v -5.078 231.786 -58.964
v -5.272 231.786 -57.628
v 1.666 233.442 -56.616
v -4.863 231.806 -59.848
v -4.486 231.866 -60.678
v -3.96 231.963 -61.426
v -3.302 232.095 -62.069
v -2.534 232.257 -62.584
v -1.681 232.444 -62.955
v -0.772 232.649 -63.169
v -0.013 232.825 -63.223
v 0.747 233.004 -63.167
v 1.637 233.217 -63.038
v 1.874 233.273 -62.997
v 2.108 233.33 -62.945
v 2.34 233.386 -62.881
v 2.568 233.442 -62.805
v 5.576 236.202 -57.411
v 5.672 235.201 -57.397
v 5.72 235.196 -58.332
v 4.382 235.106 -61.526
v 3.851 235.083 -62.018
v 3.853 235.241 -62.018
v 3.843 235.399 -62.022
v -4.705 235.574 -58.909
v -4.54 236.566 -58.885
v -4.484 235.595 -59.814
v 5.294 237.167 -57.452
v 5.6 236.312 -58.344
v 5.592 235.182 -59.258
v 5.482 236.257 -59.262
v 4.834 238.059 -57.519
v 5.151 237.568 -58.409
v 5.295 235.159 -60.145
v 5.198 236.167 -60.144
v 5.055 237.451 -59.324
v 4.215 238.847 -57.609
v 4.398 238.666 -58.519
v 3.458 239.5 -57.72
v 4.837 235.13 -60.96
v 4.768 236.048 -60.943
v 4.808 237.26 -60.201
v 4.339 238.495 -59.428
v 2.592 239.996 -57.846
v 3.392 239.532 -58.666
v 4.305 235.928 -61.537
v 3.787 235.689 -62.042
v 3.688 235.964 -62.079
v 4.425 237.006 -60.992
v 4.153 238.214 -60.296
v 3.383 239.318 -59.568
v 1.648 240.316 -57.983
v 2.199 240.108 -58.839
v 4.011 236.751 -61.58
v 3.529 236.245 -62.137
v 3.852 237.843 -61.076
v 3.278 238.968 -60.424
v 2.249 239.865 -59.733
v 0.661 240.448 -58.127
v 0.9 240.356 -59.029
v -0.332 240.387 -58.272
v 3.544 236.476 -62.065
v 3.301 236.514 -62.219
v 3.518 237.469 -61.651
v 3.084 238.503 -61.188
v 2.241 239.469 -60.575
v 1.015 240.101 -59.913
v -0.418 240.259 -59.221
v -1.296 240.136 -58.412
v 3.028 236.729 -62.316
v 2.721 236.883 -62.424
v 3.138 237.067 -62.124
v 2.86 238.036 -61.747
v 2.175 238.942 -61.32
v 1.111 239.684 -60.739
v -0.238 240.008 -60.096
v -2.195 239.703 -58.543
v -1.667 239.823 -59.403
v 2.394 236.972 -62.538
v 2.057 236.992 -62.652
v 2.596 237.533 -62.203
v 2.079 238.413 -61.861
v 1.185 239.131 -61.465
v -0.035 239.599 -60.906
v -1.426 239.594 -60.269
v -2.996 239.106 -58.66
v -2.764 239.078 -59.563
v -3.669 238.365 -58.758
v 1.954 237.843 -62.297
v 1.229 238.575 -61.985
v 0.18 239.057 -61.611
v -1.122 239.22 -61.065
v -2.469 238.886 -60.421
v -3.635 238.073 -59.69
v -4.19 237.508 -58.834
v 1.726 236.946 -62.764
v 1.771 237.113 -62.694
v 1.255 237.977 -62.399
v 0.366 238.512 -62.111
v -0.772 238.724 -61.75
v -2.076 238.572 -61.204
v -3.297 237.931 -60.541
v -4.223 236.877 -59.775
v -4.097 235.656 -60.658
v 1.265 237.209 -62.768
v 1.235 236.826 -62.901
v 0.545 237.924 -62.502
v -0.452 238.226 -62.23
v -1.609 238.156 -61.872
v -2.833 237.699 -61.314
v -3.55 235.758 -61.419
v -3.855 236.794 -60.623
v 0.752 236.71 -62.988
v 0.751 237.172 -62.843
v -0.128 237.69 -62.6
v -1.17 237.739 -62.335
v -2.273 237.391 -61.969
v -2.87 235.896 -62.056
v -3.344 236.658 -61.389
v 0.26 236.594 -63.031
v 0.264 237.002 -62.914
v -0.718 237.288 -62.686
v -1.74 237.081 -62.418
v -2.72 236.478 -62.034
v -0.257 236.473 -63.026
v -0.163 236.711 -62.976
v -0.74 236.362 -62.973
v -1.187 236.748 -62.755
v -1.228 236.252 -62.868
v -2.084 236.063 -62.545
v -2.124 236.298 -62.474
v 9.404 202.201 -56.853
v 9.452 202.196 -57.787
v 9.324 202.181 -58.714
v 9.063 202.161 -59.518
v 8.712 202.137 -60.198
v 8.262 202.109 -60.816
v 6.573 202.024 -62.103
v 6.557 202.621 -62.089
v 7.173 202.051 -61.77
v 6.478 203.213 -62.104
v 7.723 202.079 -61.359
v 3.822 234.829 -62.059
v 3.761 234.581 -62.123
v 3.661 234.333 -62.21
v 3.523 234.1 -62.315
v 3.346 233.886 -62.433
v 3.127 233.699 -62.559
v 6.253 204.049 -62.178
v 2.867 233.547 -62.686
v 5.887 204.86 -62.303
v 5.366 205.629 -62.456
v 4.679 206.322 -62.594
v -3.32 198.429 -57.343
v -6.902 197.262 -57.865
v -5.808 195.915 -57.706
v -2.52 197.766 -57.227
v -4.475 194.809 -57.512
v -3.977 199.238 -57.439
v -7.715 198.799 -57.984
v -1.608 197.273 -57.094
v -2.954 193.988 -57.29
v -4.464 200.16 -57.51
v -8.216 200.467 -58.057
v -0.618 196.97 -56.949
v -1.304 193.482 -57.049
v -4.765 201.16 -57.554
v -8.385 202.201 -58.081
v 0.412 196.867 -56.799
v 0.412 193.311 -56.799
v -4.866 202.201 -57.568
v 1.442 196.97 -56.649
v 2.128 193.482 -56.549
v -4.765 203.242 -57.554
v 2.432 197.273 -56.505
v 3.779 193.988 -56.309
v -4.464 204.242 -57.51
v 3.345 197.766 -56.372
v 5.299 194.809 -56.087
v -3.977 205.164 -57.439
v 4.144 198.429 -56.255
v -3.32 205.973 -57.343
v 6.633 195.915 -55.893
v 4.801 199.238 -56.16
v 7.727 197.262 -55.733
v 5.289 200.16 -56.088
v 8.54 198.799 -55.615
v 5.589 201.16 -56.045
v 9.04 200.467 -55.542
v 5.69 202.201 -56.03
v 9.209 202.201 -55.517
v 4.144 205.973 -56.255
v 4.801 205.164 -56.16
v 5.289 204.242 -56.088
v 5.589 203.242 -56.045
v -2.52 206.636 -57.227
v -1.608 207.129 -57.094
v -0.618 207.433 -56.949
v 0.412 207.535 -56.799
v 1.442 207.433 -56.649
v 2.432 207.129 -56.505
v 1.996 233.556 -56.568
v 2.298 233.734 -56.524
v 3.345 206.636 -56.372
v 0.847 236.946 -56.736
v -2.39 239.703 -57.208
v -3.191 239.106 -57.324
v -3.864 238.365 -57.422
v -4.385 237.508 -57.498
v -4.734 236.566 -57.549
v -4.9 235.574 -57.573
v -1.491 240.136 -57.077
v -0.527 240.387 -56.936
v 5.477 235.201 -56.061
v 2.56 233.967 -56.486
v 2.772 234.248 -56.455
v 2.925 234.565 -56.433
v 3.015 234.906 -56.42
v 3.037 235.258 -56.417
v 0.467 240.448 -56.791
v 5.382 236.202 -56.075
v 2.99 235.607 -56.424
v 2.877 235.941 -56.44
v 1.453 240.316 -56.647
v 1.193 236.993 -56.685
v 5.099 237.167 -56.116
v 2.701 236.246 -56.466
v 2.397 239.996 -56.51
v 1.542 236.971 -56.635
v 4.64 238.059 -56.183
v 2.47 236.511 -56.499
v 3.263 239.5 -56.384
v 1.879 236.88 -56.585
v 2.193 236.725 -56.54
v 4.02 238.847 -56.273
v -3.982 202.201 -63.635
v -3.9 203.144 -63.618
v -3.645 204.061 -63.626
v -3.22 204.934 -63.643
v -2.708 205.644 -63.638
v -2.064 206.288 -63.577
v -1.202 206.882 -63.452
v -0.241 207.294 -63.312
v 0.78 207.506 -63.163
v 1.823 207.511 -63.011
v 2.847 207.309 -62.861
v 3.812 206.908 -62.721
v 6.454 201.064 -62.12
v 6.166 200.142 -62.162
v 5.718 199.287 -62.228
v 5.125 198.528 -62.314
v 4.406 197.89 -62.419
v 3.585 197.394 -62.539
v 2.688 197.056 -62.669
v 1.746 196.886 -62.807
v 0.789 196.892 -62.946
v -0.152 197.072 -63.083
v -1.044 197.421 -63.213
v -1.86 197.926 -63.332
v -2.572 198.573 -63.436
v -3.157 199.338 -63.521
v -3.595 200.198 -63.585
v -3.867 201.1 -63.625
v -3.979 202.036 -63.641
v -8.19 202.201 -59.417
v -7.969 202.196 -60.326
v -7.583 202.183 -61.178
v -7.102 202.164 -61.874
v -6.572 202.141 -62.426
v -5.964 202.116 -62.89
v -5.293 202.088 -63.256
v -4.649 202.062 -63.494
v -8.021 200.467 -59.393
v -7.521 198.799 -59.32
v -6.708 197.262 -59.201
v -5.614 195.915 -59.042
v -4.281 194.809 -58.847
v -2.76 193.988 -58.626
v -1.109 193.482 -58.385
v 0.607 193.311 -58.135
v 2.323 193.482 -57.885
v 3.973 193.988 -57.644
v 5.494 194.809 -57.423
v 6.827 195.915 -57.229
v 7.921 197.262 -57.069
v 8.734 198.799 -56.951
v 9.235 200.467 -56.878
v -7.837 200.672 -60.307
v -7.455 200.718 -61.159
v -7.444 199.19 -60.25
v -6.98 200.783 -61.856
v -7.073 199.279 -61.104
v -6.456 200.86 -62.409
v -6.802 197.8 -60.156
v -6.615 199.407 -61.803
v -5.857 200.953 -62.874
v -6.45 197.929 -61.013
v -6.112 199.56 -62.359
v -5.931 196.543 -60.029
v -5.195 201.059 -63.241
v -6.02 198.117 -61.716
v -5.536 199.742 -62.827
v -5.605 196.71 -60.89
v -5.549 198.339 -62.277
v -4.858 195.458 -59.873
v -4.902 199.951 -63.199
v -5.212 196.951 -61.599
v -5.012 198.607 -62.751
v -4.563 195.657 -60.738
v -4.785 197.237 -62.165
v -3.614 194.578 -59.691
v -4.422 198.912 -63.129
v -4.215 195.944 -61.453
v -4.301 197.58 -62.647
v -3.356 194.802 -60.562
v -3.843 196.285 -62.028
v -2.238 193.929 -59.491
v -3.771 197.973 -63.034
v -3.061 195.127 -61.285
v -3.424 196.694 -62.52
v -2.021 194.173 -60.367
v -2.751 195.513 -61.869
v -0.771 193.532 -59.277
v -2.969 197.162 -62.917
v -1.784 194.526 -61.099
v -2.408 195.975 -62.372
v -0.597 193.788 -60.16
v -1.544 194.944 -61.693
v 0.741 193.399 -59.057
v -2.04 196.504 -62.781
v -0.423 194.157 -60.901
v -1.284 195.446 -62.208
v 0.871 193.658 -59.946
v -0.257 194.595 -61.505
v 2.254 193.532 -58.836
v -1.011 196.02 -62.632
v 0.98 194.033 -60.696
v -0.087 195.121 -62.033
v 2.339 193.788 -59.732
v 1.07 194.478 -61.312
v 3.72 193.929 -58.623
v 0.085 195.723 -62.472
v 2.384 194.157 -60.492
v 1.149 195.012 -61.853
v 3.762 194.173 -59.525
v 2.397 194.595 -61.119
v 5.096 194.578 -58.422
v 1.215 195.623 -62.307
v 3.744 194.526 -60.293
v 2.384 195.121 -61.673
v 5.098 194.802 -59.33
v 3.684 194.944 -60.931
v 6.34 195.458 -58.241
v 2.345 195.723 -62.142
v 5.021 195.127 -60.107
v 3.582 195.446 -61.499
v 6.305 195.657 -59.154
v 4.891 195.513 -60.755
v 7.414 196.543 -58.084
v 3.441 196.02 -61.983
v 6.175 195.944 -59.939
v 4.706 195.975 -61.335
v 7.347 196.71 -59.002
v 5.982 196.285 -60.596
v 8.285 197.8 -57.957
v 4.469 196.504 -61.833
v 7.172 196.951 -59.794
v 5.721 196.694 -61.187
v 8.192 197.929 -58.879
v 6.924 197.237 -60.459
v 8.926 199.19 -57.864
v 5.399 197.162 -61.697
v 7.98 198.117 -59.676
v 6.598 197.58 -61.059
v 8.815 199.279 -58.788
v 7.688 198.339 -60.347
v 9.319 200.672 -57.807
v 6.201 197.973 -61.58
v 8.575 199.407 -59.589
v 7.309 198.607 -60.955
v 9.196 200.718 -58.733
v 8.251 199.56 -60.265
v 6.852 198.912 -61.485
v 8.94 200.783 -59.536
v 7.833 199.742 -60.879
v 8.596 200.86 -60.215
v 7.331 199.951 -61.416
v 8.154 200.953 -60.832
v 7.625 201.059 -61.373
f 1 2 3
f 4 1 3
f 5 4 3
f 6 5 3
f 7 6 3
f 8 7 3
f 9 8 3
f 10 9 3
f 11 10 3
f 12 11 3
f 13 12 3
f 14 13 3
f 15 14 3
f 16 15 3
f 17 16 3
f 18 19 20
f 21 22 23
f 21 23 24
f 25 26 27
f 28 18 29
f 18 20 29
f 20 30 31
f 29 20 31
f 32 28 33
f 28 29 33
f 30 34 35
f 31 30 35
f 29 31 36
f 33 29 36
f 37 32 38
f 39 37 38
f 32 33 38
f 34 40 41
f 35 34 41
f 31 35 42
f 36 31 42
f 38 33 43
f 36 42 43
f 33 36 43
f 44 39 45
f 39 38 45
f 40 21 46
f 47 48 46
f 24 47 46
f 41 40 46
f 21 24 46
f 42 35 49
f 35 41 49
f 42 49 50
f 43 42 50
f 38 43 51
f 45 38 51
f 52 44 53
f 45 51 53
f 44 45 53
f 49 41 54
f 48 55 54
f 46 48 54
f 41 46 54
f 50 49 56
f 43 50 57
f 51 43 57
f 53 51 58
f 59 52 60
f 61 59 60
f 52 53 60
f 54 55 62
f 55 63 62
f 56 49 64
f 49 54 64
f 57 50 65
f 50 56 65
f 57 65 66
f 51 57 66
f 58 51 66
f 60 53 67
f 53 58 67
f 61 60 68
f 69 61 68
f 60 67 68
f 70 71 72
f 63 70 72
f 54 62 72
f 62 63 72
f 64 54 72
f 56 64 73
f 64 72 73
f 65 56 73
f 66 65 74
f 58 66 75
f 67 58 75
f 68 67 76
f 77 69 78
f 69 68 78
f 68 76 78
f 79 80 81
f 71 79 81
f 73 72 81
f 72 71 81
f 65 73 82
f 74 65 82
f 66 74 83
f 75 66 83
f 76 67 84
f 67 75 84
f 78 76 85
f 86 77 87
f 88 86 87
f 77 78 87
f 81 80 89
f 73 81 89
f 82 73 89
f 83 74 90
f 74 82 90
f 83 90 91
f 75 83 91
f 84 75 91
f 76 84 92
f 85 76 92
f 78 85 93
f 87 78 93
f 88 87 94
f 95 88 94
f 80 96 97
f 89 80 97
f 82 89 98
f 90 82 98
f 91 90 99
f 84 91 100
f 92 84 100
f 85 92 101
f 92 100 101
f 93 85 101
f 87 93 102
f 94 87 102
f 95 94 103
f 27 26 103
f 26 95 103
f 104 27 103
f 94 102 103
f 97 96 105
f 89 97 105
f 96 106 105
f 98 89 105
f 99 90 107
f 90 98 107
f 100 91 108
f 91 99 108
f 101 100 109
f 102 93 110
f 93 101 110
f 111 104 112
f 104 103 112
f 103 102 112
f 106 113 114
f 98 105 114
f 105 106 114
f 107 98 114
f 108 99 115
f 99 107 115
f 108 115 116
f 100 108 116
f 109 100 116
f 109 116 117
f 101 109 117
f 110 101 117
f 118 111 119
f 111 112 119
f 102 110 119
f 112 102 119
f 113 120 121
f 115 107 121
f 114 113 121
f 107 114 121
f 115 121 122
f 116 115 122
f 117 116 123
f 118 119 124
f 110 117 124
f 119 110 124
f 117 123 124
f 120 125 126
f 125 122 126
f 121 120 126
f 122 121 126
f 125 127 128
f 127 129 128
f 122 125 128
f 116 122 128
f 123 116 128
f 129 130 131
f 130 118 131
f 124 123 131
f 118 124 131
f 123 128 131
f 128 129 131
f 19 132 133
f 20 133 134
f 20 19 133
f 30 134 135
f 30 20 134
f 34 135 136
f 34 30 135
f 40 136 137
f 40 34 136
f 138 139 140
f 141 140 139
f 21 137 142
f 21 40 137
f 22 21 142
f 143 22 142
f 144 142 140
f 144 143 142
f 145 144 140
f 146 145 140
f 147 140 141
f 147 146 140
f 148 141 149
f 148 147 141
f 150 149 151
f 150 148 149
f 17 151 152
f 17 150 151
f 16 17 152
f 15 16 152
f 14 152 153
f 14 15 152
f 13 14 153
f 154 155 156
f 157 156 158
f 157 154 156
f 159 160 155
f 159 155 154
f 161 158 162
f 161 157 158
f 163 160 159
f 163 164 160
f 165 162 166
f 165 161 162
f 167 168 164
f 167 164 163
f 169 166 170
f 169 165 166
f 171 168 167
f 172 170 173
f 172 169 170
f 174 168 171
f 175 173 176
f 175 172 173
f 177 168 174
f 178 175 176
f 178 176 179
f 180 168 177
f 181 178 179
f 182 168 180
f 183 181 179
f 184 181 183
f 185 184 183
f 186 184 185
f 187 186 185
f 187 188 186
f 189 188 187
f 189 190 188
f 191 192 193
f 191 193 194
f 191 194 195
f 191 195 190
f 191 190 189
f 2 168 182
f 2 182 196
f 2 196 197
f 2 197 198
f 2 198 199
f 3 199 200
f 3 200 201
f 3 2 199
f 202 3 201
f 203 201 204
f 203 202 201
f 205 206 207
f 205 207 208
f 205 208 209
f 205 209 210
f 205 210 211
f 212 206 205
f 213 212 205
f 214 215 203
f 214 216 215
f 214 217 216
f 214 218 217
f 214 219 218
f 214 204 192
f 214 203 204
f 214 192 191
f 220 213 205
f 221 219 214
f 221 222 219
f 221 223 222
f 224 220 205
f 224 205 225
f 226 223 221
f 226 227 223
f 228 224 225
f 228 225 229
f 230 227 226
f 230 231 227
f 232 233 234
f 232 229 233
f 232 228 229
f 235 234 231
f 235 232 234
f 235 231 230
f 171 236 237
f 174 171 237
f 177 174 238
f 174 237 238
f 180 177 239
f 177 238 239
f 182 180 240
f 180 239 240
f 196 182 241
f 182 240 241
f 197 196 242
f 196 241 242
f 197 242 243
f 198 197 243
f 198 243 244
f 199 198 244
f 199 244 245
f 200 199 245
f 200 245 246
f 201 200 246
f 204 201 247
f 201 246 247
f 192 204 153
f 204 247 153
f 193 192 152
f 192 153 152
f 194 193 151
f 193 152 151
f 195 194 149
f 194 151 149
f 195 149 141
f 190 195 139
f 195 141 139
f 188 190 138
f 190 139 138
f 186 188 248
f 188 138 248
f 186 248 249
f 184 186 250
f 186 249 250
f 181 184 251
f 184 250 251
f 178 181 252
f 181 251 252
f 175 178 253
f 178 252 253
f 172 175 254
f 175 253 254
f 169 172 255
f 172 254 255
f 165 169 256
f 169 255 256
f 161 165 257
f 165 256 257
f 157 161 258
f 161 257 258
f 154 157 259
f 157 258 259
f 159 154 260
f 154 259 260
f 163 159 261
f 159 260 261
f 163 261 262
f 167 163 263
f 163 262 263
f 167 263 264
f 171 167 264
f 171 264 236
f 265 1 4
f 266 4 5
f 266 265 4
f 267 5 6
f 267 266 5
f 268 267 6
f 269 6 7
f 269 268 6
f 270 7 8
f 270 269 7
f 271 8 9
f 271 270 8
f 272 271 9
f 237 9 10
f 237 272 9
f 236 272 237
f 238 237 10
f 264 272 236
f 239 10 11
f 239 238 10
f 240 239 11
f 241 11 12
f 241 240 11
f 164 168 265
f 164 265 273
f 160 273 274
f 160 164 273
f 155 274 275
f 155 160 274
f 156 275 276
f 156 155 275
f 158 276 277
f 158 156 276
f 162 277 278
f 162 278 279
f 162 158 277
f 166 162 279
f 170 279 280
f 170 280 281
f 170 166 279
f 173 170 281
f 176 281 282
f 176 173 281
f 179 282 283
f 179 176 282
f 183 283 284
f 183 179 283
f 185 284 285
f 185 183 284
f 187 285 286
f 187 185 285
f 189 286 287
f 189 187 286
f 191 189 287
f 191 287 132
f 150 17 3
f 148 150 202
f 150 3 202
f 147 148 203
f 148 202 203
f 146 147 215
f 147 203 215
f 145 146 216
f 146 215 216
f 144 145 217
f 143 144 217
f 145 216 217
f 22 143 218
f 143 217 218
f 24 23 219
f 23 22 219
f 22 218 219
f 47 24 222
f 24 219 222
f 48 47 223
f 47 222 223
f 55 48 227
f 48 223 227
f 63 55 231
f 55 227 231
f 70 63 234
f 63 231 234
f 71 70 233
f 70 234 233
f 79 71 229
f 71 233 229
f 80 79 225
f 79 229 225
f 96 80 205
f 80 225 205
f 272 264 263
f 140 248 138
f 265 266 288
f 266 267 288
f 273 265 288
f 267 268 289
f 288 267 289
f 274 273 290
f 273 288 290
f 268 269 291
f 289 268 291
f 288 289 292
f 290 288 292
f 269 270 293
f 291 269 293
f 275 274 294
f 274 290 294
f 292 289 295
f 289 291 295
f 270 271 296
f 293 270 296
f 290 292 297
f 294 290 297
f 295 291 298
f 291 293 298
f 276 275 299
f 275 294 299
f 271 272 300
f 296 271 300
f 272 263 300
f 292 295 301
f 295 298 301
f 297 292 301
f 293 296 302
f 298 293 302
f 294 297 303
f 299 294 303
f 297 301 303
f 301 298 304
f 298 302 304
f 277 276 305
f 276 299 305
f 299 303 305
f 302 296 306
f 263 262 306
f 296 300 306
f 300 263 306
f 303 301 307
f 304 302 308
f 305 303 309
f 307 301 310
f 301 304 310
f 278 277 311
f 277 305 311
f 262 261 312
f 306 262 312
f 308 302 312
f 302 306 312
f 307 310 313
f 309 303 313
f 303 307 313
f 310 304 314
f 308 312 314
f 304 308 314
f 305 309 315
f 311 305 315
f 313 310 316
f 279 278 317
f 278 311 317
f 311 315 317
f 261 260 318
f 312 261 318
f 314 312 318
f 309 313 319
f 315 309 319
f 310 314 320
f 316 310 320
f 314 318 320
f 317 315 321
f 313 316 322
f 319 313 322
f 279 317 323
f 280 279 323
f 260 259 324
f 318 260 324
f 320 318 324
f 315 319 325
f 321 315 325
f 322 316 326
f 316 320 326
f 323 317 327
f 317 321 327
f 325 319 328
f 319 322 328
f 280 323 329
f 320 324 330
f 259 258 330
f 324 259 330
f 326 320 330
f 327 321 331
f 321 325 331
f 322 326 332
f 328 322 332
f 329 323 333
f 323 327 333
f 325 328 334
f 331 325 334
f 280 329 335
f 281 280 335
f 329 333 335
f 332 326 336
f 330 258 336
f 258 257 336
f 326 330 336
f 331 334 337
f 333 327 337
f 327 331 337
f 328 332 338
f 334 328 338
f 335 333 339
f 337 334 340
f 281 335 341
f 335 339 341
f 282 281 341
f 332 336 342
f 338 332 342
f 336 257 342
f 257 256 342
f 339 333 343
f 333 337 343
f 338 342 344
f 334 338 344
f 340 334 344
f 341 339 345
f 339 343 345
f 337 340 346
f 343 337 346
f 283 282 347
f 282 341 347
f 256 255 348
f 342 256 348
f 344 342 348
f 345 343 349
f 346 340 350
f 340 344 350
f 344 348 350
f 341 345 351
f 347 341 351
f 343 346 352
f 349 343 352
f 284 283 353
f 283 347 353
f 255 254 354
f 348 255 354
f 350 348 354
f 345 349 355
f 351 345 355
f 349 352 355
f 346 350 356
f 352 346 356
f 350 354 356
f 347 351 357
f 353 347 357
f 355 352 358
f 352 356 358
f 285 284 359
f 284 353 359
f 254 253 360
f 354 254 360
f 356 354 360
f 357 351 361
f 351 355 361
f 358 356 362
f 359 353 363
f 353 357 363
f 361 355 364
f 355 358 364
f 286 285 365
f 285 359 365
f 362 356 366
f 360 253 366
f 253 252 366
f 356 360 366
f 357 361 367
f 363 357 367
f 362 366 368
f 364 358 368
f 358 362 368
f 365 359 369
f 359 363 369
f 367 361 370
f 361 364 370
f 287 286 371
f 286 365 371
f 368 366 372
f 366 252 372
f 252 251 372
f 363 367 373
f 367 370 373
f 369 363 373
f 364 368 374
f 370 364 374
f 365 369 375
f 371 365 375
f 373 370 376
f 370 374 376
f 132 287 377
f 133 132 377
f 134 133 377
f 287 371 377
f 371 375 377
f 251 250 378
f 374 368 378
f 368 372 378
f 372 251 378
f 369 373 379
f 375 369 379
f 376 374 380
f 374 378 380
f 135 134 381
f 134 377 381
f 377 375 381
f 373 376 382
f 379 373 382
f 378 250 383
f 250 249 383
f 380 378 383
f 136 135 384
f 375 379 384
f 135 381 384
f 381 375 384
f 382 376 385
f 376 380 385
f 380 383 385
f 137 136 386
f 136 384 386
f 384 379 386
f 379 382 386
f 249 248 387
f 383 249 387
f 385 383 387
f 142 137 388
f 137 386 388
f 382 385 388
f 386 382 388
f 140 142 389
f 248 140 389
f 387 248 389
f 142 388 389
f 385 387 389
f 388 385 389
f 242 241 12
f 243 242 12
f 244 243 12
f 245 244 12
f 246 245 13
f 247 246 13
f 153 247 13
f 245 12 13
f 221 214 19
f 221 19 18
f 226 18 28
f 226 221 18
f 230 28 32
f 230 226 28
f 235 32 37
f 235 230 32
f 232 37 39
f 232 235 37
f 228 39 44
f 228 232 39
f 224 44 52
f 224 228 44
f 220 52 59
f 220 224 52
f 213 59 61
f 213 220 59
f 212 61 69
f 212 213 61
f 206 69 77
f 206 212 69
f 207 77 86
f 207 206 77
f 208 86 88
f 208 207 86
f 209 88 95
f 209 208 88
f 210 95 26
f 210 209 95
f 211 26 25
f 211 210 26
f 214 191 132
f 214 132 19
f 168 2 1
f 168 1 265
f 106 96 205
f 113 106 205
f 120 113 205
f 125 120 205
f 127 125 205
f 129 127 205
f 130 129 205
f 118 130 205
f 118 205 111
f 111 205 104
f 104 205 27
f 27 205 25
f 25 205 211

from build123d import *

# Parameters (mm, degrees)
BASE_EXTRUDE_DEPTH = 6.35
FILLET1_R          = 5
CUT_EXTRUDE1_START = -6.35
CUT_EXTRUDE1_DEPTH = 6.350746
SKETCH4_R          = 5.334
CUT_EXTRUDE2_DEPTH = 6.35


with BuildPart() as part:
    # Sketch1 → Base Extrude (new body)
    with BuildSketch(Plane(origin=(8.114628625, -3.283425705, -55.67660861), x_dir=(-0.989545354, 0, -0.144222022), z_dir=(0.144222022, 0, -0.989545354))):
        with BuildLine():
            Line((-1.106091457, 205.484448373), (2.665349365, 238.484448373))
            ThreePointArc((2.665349365, 238.484448373), (7.915349365, 243.734448373), (13.165349365, 238.484448373))
            Line((13.165349365, 238.484448373), (16.673908543, 205.484448373))
            ThreePointArc((16.673908543, 205.484448373), (7.783908543, 196.594448373), (-1.106091457, 205.484448373))
        make_face()
    extrude(amount=BASE_EXTRUDE_DEPTH)

    # Fillet1
    fillet1_edges = [part.edges().sort_by_distance(p)[0] for p in [
        (-5.733211058, 218.701022668, -64.111960662),
        (1.327907925, 193.311022668, -63.082832637),
        (8.258960253, 218.701022668, -62.072661274),
        (1.19784127, 240.451022668, -63.101789298),
    ]]
    fillet(fillet1_edges, radius=FILLET1_R)

    # Sketch3 → Cut-Extrude1 (cut)
    with BuildSketch(Plane(origin=(9.030438463, -3.283425705, -61.96022161), x_dir=(-0.989545354, 0, -0.144222022), z_dir=(0.144222022, 0, -0.989545354)).offset(CUT_EXTRUDE1_START)):
        with BuildLine():
            Line((14.3026167, 234.886394841), (6.516843813, 236.725345777))
            ThreePointArc((6.516843813, 236.725345777), (5.178808874, 238.890908637), (7.344371734, 240.228943576))
            Line((7.344371734, 240.228943576), (15.130144622, 238.38999264))
            ThreePointArc((15.130144622, 238.38999264), (16.468179561, 236.22442978), (14.3026167, 234.886394841))
        make_face()
    extrude(amount=CUT_EXTRUDE1_DEPTH, mode=Mode.SUBTRACT)


with BuildPart() as body_2:
    # Mirror2: mirrored copy
    add(part.part.mirror(Plane(origin=(-103.213448145, 0, -15.042920567), x_dir=(-0.144222022, 0, 0.989545354), z_dir=(0.989545354, 0, 0.144222022))))


with BuildPart() as part_1:
    add(part.part)

    # Sketch4 → Cut-Extrude2 (cut)
    with BuildSketch(Plane(origin=(9.030438463, 0, -61.96022161), x_dir=(-0.989545354, 0, -0.144222022), z_dir=(0.144222022, 0, -0.989545354))):
        with Locations((7.783908543, 202.201022668)):
            Circle(SKETCH4_R)
    cut_extrude2 = extrude(amount=-CUT_EXTRUDE2_DEPTH, mode=Mode.SUBTRACT)


with BuildPart() as body_2_1:
    add(body_2.part)

    # Mirror3: Cut-Extrude2 across plane
    add(cut_extrude2.mirror(Plane(origin=(-103.213448145, 0, -15.042920567), x_dir=(-0.144222022, 0, 0.989545354), z_dir=(0.989545354, 0, 0.144222022))), mode=Mode.SUBTRACT)


solid = part_1.part
